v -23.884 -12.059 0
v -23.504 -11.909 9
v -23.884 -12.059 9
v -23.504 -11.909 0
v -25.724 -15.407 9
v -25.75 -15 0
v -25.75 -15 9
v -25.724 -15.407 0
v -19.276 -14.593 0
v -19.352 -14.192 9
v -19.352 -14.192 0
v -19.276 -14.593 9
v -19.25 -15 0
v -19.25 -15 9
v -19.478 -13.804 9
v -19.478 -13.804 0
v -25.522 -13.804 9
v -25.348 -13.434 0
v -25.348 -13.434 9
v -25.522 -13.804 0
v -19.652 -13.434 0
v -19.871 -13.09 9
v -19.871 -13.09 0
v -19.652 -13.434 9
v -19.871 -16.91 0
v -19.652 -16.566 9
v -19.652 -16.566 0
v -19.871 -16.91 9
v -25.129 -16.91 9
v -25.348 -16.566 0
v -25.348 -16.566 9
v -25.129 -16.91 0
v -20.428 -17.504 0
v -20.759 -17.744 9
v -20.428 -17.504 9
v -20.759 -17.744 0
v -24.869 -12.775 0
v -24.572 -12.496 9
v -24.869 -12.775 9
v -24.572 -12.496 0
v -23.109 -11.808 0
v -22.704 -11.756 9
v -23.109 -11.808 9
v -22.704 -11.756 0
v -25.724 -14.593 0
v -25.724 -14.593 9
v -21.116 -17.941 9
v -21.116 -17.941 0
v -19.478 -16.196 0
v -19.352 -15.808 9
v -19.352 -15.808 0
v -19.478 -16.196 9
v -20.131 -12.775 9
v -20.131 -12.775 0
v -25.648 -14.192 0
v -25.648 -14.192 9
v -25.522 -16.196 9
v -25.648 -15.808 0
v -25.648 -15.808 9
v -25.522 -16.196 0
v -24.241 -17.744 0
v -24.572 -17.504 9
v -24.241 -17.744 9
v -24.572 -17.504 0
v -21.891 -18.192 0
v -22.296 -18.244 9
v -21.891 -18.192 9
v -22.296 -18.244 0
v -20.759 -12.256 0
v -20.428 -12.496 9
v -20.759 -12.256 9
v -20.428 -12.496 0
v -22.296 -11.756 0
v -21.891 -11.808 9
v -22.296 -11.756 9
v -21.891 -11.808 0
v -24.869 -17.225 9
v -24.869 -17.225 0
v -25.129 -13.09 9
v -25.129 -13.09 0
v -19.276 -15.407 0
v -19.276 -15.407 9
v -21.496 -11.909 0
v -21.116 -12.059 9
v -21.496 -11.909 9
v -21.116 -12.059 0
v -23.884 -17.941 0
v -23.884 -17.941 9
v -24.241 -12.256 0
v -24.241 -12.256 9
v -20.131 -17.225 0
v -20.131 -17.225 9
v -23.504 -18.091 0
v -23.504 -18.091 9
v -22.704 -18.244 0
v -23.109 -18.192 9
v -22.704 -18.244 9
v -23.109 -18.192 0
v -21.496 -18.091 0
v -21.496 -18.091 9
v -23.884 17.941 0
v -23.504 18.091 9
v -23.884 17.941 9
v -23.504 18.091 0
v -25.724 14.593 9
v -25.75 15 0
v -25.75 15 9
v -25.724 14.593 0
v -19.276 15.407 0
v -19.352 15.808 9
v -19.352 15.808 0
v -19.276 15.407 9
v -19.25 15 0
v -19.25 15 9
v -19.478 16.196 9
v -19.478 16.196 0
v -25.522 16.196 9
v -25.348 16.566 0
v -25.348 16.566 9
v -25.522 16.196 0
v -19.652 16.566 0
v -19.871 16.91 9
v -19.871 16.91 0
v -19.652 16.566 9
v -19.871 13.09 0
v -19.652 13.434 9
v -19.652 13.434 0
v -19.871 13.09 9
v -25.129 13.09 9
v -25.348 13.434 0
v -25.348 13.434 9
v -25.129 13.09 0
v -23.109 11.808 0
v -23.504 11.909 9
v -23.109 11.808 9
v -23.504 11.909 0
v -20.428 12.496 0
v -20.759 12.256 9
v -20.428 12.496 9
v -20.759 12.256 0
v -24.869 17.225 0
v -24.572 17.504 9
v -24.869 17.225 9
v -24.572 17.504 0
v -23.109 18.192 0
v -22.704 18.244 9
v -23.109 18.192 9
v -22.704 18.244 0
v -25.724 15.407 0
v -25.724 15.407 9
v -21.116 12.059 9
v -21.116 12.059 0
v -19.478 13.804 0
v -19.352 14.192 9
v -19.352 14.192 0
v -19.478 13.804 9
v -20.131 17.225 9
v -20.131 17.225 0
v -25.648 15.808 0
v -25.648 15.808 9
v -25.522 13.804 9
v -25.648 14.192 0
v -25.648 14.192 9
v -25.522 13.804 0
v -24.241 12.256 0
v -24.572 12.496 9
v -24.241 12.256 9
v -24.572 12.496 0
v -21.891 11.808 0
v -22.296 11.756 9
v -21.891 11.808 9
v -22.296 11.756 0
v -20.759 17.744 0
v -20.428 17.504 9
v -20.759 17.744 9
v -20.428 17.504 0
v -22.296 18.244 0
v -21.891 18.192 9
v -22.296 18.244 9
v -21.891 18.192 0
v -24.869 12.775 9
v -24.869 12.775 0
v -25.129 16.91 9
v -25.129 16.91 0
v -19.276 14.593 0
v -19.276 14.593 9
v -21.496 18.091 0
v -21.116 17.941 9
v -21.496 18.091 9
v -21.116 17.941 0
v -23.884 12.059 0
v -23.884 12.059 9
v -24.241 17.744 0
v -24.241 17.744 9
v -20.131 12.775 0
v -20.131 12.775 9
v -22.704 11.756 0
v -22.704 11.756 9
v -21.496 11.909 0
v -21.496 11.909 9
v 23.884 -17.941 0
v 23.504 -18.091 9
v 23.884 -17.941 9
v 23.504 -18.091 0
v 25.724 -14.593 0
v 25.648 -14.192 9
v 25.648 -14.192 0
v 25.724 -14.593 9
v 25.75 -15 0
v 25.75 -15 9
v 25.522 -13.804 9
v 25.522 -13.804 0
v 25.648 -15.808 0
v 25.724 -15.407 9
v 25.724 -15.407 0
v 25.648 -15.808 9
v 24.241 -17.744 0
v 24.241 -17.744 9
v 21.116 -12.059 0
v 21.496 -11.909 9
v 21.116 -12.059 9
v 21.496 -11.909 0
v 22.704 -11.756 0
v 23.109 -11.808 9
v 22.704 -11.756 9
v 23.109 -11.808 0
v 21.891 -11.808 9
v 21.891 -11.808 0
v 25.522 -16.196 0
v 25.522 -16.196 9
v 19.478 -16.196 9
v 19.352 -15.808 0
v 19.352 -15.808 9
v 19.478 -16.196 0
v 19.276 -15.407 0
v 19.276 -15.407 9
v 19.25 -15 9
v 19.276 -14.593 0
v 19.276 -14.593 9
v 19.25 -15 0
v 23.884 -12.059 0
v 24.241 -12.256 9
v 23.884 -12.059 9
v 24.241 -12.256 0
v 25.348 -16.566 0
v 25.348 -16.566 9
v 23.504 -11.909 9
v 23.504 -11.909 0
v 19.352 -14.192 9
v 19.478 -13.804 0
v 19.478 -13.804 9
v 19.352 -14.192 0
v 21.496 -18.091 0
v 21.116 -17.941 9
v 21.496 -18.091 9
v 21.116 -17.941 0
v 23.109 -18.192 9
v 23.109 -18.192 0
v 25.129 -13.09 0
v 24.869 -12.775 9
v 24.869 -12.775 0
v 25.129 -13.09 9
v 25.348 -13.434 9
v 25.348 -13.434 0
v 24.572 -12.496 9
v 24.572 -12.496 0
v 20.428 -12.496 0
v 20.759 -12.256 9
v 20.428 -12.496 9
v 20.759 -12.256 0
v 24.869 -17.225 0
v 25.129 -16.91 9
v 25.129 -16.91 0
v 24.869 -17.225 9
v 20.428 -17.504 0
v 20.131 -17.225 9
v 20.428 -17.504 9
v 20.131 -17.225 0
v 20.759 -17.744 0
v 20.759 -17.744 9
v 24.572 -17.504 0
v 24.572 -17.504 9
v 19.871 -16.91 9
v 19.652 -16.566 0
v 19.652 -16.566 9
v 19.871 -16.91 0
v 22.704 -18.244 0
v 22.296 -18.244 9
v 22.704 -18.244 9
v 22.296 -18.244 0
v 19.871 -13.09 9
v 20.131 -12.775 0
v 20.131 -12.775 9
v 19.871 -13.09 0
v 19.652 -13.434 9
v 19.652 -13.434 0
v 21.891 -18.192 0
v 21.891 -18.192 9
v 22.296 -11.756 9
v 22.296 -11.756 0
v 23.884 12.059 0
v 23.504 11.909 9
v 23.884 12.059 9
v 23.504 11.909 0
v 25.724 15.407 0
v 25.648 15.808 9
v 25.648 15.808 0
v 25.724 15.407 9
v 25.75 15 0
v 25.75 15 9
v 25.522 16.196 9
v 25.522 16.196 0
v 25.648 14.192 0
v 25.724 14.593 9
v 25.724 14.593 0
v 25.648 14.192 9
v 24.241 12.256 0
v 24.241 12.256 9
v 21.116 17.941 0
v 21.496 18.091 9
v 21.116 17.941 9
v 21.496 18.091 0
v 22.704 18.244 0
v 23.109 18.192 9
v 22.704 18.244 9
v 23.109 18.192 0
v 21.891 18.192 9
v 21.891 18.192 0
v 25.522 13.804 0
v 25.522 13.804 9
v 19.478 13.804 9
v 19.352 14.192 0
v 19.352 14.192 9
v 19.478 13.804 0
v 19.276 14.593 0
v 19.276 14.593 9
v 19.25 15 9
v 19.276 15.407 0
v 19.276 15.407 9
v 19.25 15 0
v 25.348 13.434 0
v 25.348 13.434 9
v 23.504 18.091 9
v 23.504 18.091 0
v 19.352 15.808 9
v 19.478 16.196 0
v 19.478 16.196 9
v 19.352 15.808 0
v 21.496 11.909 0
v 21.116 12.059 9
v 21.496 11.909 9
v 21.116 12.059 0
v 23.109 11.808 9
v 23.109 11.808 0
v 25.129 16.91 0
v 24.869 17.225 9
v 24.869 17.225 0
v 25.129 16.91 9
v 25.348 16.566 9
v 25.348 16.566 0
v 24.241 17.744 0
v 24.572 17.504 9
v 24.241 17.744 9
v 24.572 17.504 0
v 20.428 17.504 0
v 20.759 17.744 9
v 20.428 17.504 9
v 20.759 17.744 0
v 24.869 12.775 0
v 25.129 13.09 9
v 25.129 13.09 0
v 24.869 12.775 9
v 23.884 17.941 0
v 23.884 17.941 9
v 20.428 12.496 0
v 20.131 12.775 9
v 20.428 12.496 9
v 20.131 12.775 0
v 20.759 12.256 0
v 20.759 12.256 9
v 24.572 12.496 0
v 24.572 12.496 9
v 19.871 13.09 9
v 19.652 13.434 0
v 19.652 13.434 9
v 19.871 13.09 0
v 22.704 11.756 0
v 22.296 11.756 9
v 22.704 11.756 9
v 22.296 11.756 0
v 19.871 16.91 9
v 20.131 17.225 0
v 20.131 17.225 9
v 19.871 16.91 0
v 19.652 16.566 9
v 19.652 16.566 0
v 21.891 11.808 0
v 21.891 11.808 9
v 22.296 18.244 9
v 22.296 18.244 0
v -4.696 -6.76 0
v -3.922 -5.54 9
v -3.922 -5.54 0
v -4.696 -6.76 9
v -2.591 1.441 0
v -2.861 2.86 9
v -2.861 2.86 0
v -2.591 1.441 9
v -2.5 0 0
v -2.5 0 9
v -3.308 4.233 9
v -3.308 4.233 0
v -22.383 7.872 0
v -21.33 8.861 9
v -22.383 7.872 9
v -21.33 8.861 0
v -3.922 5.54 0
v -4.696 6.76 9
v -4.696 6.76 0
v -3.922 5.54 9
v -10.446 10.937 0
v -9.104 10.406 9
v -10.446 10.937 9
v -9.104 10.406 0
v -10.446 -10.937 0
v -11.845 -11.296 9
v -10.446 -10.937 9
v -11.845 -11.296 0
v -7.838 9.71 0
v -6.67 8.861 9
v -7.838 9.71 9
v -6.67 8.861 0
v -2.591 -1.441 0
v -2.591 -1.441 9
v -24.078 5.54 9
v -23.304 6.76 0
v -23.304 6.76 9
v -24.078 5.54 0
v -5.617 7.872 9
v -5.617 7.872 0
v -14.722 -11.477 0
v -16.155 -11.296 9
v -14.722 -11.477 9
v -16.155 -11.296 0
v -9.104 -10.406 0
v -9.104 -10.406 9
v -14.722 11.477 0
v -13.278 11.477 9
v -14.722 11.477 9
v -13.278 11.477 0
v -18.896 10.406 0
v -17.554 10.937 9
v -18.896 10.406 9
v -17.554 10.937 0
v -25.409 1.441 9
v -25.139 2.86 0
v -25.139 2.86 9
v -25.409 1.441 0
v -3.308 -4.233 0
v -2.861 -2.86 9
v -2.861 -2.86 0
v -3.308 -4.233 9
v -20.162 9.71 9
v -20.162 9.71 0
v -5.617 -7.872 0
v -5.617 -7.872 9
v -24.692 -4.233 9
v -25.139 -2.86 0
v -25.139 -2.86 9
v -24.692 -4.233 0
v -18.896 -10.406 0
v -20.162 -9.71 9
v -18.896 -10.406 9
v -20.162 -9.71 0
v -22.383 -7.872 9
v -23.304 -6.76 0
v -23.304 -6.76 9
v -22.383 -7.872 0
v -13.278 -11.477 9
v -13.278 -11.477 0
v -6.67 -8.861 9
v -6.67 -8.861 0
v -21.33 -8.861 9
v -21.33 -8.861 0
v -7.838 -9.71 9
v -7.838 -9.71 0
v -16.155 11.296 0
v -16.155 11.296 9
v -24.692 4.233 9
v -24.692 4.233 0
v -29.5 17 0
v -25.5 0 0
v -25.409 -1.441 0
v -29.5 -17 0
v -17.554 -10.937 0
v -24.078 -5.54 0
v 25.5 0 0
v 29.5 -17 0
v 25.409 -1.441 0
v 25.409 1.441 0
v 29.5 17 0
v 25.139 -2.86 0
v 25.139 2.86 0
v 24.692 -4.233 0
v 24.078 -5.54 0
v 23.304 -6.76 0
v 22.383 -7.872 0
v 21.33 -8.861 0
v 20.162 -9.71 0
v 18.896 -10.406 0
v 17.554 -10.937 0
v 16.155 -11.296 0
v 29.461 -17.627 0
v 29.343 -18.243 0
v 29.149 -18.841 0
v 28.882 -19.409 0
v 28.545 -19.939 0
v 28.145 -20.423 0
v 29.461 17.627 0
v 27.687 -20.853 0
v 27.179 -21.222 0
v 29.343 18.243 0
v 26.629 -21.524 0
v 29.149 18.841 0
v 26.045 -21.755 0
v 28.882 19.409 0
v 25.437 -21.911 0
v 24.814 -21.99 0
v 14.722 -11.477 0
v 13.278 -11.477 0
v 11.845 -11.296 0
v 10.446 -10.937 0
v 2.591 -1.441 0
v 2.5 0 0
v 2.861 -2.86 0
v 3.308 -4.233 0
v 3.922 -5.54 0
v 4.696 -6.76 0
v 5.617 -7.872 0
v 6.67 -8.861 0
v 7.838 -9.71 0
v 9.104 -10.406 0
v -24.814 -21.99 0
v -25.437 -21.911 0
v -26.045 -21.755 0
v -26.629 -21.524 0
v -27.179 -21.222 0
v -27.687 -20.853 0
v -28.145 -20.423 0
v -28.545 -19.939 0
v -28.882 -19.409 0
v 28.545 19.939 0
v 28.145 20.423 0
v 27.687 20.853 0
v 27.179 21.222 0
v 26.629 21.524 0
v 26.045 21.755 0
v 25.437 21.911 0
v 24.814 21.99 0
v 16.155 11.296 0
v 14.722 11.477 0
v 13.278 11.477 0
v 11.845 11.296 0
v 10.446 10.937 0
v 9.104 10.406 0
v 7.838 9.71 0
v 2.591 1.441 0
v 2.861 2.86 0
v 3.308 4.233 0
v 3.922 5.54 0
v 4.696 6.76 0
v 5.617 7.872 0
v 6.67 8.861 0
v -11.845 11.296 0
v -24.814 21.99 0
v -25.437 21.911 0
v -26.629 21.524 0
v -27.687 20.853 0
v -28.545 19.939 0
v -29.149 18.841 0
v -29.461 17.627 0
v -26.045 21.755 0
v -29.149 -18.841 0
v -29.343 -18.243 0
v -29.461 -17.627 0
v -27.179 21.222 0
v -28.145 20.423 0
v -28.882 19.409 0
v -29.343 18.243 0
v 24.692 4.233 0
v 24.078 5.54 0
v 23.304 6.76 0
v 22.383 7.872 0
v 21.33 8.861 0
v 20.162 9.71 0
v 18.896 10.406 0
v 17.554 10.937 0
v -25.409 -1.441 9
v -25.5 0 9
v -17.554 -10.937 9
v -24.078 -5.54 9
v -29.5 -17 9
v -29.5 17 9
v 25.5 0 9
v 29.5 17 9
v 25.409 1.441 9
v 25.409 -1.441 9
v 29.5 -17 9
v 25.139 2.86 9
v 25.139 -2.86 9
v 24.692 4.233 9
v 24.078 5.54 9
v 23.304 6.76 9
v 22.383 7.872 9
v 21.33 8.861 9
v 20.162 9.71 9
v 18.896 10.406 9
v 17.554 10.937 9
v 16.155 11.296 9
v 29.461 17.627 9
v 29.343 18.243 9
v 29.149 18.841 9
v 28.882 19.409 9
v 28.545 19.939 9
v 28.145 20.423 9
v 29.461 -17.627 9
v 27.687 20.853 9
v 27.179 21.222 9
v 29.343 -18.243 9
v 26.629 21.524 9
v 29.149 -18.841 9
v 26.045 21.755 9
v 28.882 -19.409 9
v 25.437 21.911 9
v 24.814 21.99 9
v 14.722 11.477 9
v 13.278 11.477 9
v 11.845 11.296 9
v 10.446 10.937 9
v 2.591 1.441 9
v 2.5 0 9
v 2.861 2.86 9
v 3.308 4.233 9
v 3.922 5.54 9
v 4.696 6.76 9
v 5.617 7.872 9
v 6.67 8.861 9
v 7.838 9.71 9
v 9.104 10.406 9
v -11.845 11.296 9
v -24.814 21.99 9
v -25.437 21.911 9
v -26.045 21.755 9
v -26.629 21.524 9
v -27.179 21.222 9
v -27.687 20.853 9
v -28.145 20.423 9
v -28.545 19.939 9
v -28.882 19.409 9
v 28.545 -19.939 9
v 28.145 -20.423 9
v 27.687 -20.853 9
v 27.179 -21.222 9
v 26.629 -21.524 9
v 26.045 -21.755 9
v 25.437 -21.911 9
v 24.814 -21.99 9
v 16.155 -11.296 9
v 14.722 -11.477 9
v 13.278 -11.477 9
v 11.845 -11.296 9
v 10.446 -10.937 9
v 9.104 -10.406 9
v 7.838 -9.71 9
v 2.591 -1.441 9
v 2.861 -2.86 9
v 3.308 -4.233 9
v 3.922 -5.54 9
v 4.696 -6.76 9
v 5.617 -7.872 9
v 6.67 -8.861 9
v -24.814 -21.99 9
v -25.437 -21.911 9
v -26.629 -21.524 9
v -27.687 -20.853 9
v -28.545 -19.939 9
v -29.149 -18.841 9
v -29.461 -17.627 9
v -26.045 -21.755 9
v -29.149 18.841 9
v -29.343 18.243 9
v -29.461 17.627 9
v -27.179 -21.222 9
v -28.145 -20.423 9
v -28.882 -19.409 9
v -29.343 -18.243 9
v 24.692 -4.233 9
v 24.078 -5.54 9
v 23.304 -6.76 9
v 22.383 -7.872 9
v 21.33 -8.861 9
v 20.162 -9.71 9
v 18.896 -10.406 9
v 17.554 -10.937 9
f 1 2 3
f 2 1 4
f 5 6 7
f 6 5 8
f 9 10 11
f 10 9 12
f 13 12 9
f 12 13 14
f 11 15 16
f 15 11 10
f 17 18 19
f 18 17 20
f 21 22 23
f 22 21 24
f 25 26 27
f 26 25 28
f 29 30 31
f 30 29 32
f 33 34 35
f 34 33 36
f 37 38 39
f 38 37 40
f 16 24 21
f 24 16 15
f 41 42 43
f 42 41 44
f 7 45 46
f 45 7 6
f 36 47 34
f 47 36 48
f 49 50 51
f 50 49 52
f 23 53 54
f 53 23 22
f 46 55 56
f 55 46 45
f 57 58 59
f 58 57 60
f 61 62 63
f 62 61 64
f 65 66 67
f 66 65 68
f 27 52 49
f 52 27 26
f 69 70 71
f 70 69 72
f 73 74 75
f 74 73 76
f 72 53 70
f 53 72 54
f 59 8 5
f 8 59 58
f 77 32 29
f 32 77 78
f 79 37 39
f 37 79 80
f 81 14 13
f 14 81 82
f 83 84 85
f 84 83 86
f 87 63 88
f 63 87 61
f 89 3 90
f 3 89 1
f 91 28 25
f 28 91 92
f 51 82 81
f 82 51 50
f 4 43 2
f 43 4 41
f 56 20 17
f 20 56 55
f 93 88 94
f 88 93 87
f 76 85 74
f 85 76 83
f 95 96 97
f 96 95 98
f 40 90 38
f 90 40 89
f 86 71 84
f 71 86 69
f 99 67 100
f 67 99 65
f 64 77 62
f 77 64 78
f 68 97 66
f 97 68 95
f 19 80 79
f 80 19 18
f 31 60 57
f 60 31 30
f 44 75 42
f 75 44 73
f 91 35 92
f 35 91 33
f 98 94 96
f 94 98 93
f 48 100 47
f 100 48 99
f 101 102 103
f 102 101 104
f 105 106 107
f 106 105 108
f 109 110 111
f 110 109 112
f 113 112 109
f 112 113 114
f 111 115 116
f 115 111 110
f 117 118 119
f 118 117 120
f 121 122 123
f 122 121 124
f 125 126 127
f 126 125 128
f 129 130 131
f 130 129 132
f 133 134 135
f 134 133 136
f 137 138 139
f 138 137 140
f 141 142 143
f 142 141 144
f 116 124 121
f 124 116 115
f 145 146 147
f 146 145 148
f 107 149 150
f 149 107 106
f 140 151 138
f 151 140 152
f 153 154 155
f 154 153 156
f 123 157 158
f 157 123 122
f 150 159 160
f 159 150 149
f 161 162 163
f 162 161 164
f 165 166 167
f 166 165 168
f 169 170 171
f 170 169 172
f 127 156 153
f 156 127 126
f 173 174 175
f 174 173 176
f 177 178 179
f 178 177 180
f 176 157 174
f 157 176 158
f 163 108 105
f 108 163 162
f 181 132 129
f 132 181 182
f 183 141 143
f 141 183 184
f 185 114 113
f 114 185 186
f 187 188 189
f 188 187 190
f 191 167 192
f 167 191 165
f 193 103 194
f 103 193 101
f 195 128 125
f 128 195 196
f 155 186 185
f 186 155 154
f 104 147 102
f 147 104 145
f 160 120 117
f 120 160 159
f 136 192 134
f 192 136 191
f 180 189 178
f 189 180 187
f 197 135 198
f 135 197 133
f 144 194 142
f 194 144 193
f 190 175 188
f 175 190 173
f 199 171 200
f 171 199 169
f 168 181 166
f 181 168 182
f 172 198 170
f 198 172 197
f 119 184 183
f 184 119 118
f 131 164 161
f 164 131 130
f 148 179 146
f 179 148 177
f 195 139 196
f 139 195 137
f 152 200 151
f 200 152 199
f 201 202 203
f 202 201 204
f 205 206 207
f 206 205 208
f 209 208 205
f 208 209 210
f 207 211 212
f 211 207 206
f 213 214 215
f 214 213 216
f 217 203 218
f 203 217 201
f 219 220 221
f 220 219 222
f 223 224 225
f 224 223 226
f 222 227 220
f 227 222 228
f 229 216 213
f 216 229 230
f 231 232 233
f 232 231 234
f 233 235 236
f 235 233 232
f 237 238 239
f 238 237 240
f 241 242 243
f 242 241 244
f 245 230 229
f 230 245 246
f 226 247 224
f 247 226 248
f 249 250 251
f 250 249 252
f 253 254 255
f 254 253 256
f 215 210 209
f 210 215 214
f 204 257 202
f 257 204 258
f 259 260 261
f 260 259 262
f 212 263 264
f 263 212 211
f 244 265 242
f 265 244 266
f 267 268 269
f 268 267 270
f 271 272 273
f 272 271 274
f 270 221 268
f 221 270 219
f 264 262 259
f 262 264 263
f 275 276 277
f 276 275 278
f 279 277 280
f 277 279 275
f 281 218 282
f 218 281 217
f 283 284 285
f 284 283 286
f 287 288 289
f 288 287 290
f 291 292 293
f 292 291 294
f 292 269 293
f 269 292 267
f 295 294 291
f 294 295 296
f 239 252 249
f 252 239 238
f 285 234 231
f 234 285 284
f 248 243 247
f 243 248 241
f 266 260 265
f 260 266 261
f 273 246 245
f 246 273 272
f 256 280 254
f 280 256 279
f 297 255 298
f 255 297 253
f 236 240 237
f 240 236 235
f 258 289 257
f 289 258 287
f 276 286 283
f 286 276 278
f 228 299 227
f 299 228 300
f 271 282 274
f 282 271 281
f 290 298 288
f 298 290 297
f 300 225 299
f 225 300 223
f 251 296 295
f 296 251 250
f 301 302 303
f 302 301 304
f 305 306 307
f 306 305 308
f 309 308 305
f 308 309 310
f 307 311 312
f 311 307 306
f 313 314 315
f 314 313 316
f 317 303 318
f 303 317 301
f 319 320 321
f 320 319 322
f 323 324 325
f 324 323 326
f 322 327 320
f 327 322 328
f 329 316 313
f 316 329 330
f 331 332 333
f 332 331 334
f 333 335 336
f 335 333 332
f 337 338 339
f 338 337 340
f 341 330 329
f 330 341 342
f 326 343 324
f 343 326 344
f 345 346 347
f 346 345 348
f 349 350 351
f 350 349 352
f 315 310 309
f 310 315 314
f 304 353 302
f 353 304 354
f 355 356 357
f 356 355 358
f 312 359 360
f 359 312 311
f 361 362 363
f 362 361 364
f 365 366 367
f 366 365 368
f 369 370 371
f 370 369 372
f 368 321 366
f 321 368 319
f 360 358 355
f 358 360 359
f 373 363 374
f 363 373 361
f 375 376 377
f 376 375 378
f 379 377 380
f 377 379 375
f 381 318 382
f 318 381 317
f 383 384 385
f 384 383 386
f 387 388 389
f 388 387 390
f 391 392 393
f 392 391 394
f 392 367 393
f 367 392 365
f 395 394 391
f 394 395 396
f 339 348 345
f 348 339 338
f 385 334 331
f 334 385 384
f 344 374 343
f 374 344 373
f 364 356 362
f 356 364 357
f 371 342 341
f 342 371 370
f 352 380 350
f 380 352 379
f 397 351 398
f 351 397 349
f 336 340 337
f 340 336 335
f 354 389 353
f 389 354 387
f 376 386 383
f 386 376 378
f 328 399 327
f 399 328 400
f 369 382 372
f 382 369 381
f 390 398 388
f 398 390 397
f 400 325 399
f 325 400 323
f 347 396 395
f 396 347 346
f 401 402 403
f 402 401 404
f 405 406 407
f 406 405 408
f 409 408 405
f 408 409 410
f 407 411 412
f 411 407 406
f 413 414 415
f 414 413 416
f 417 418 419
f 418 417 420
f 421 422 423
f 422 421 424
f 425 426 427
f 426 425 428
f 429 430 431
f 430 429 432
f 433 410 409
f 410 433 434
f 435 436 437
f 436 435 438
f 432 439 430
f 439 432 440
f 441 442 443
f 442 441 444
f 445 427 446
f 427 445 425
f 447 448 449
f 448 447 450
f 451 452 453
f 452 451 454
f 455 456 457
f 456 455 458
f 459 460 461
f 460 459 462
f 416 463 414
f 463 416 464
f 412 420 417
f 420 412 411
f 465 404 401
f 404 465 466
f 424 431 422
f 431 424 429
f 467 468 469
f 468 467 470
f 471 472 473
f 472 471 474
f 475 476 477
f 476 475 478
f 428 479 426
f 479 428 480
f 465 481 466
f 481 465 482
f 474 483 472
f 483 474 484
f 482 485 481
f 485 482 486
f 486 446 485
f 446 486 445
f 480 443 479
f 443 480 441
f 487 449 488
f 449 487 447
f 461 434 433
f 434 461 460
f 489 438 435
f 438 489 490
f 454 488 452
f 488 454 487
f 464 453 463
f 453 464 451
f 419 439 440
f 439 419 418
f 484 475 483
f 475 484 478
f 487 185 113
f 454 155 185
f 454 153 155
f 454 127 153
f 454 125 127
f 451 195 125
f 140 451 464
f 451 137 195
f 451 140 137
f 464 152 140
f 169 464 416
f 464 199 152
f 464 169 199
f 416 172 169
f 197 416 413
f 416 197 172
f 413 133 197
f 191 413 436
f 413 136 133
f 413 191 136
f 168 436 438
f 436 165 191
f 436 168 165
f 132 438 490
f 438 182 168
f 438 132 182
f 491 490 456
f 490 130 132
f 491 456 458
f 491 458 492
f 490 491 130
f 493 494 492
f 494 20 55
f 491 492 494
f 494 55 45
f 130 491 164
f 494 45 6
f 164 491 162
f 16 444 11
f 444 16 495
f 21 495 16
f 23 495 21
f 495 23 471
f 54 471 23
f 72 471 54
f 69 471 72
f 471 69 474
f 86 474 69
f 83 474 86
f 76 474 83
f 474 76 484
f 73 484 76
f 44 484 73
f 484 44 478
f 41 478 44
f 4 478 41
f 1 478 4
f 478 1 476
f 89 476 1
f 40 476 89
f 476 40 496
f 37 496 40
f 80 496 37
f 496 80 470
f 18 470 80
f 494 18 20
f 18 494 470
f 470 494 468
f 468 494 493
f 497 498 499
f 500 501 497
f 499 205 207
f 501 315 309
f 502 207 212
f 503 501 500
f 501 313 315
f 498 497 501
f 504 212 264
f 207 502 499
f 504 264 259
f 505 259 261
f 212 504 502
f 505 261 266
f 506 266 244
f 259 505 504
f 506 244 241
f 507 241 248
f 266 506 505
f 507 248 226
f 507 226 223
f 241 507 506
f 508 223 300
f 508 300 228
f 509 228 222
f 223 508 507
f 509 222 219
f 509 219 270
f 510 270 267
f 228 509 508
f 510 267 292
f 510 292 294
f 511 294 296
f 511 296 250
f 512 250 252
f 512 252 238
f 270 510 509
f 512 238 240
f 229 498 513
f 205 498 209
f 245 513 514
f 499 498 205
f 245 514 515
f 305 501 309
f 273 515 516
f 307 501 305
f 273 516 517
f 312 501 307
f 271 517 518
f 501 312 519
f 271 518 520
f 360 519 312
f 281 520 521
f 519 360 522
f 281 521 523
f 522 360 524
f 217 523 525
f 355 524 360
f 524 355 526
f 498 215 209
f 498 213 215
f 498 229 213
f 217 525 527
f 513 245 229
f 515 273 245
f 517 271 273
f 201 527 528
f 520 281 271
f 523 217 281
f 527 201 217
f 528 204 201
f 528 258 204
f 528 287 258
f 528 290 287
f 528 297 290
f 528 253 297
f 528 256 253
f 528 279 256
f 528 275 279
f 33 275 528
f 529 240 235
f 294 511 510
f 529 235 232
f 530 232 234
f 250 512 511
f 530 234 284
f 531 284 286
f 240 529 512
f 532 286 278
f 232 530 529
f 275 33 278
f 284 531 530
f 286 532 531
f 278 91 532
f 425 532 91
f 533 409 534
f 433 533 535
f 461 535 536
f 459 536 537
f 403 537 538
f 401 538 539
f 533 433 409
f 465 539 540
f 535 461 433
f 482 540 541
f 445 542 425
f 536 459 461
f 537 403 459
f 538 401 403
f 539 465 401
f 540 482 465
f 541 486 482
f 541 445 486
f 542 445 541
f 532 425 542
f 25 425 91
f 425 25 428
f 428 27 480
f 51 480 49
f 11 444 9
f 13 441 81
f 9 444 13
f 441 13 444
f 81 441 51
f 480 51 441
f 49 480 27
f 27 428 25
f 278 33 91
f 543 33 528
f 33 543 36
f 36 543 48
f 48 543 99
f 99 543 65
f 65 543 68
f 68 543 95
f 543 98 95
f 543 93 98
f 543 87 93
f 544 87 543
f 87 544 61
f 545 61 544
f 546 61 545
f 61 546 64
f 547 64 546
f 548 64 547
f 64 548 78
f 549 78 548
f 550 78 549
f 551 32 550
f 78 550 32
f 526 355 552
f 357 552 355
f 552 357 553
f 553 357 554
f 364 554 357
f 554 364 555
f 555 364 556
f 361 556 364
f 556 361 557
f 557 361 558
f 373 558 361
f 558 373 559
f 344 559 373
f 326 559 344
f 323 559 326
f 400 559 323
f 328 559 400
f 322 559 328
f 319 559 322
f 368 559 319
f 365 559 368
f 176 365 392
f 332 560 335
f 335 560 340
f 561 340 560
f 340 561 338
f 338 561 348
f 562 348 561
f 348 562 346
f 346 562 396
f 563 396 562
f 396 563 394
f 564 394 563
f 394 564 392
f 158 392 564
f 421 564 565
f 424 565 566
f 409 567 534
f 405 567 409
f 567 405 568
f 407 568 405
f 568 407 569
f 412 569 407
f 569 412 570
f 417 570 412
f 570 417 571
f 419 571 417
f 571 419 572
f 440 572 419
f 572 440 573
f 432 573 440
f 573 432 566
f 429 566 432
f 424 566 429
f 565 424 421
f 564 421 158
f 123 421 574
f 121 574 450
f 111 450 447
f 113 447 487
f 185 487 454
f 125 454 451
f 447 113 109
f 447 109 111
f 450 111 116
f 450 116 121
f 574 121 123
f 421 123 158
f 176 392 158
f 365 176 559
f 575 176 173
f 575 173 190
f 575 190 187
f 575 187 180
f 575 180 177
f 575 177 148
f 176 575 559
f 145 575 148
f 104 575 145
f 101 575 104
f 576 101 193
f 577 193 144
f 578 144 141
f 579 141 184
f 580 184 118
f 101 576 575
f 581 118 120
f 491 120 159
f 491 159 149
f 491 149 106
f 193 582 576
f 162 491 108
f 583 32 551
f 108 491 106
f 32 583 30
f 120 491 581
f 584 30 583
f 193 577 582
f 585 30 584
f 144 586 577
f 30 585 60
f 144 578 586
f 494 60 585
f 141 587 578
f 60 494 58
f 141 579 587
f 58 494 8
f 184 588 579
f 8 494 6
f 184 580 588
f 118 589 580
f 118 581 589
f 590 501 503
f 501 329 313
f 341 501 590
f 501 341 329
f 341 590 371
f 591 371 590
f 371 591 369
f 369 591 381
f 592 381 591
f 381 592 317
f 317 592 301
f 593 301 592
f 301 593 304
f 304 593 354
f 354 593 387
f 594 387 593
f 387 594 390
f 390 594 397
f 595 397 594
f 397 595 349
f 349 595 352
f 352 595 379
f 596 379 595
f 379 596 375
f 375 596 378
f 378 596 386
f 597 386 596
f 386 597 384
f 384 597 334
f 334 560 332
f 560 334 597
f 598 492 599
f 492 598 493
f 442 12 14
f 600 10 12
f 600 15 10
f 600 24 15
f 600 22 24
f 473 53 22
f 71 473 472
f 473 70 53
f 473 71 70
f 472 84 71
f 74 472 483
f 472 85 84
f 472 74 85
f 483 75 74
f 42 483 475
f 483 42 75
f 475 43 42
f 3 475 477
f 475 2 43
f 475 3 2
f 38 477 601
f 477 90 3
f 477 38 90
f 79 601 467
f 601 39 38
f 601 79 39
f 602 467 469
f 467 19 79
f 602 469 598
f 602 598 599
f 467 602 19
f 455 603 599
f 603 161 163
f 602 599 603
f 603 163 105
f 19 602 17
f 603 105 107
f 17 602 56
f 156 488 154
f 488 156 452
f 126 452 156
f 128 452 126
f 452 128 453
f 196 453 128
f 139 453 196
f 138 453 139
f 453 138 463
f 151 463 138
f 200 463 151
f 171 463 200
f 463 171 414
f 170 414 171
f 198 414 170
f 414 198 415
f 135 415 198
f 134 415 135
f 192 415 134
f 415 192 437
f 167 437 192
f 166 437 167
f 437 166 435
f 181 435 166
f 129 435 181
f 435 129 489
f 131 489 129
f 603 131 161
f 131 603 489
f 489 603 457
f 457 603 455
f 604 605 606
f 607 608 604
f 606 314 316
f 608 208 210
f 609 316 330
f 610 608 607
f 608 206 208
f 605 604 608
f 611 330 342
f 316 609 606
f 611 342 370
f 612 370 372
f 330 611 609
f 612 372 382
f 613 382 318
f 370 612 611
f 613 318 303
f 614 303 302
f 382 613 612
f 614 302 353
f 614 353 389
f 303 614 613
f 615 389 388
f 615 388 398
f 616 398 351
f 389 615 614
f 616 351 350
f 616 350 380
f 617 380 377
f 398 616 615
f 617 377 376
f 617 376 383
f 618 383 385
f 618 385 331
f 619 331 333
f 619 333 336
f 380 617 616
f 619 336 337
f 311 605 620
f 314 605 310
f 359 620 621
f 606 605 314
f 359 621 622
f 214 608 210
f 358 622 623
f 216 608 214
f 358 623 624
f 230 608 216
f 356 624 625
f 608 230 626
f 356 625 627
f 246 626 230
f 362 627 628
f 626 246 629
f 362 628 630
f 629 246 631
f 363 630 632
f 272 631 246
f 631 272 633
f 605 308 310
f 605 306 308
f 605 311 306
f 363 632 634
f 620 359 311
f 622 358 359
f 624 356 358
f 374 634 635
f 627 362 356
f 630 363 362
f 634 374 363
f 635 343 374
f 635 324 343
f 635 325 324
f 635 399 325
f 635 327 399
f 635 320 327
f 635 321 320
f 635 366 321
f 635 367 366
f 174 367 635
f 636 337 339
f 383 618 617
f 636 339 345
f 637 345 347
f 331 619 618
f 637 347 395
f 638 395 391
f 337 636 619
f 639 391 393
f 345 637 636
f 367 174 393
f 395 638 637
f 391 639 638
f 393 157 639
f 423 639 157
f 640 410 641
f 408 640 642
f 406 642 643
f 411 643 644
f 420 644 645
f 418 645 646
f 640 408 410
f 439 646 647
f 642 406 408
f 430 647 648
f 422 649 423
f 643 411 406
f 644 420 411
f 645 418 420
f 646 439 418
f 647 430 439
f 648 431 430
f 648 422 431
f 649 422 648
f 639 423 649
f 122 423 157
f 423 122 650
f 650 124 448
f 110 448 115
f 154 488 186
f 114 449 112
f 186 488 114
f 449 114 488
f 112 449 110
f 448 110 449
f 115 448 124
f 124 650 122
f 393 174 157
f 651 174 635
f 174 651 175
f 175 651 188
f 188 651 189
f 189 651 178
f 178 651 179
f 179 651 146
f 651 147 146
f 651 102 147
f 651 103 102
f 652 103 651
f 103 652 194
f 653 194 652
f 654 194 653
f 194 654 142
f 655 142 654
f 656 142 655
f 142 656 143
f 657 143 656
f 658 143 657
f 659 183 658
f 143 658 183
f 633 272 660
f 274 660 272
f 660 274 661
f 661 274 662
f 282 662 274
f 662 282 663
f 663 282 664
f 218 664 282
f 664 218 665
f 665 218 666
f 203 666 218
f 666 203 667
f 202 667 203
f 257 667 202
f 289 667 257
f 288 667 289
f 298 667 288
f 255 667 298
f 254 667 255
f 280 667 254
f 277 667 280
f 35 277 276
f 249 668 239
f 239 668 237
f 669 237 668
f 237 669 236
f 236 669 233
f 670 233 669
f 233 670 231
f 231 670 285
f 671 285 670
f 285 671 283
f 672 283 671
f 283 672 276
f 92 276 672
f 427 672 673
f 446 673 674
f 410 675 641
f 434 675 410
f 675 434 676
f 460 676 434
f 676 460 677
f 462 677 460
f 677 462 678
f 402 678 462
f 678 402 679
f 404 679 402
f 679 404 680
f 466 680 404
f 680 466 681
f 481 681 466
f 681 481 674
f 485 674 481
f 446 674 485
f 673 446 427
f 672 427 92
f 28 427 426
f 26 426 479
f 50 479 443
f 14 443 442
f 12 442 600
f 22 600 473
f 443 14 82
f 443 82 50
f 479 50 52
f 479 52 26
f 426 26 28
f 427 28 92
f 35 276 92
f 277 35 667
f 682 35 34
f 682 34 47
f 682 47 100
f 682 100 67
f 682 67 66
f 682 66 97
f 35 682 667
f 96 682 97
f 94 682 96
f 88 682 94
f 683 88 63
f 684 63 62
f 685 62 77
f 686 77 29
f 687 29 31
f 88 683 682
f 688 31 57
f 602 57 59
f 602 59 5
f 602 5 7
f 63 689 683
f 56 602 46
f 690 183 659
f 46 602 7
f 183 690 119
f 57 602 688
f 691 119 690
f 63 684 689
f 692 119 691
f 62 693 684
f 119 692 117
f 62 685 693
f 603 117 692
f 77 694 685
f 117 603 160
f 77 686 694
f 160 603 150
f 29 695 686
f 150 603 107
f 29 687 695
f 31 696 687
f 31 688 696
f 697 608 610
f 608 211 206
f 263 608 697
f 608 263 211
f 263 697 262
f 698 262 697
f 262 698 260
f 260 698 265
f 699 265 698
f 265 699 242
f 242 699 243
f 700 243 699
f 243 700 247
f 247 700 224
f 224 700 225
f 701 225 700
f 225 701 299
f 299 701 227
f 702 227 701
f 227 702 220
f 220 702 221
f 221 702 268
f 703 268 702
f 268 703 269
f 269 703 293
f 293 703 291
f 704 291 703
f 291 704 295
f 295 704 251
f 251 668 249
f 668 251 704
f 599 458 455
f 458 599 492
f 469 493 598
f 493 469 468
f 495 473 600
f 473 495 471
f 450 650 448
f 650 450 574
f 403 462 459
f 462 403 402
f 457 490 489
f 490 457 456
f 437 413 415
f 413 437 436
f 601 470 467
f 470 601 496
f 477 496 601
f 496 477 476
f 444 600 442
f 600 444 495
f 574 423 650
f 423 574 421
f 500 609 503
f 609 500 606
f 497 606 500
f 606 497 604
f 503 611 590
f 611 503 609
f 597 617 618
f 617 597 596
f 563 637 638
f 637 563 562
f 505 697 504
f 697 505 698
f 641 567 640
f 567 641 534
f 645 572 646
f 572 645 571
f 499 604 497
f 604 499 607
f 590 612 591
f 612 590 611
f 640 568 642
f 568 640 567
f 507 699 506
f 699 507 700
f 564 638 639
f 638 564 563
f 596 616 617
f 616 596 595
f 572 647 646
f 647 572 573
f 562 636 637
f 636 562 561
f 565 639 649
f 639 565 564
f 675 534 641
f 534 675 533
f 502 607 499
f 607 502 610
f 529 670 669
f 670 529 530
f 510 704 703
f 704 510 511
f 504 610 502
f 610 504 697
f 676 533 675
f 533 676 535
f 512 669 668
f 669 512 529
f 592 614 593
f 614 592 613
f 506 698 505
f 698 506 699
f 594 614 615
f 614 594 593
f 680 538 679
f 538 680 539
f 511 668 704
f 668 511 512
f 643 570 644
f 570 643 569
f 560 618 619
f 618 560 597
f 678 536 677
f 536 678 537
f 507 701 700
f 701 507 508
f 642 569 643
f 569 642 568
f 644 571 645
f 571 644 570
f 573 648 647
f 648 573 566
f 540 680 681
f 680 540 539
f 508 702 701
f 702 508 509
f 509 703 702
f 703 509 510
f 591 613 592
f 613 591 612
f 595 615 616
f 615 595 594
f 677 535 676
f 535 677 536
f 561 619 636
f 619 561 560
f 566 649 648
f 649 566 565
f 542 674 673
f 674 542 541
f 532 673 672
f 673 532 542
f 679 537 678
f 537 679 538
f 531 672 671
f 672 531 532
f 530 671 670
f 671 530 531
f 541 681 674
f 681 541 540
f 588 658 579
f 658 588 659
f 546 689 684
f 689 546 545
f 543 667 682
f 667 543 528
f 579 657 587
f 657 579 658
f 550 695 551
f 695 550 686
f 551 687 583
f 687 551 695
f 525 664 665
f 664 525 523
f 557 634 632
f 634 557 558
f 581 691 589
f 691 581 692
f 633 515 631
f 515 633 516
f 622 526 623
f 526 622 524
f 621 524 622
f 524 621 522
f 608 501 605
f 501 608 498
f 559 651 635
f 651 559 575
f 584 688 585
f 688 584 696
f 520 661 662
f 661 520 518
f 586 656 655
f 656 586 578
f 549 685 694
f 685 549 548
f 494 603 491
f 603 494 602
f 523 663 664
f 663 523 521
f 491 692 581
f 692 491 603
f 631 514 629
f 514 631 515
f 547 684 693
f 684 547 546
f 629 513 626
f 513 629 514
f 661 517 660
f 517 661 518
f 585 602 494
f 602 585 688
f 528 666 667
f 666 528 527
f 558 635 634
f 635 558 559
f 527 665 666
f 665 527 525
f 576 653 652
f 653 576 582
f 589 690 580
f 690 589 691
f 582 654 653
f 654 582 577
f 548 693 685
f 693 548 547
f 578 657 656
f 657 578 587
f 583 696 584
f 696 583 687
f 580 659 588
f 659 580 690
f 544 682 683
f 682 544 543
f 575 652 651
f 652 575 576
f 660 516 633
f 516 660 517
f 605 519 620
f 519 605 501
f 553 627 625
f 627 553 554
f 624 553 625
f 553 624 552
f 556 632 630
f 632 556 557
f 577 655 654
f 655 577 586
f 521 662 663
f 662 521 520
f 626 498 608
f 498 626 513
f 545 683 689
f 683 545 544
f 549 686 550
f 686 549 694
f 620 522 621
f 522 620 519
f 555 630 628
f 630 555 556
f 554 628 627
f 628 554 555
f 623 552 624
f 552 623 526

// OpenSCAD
$fn = 50;


difference() {
	union() {
		hull() {
			translate(v = [-24.5000000000, 17.0000000000, 0]) {
				cylinder(h = 9, r = 5);
			}
			translate(v = [24.5000000000, 17.0000000000, 0]) {
				cylinder(h = 9, r = 5);
			}
			translate(v = [-24.5000000000, -17.0000000000, 0]) {
				cylinder(h = 9, r = 5);
			}
			translate(v = [24.5000000000, -17.0000000000, 0]) {
				cylinder(h = 9, r = 5);
			}
		}
	}
	union() {
		#translate(v = [-22.5000000000, -15.0000000000, -100.0000000000]) {
			cylinder(h = 200, r = 3.2500000000);
		}
		#translate(v = [-22.5000000000, 15.0000000000, -100.0000000000]) {
			cylinder(h = 200, r = 3.2500000000);
		}
		#translate(v = [22.5000000000, -15.0000000000, -100.0000000000]) {
			cylinder(h = 200, r = 3.2500000000);
		}
		#translate(v = [22.5000000000, 15.0000000000, -100.0000000000]) {
			cylinder(h = 200, r = 3.2500000000);
		}
		#translate(v = [-14.0000000000, 0, 0]) {
			cylinder(h = 9, r = 11.5000000000);
		}
		#translate(v = [14.0000000000, 0, 0]) {
			cylinder(h = 9, r = 11.5000000000);
		}
	}
}
